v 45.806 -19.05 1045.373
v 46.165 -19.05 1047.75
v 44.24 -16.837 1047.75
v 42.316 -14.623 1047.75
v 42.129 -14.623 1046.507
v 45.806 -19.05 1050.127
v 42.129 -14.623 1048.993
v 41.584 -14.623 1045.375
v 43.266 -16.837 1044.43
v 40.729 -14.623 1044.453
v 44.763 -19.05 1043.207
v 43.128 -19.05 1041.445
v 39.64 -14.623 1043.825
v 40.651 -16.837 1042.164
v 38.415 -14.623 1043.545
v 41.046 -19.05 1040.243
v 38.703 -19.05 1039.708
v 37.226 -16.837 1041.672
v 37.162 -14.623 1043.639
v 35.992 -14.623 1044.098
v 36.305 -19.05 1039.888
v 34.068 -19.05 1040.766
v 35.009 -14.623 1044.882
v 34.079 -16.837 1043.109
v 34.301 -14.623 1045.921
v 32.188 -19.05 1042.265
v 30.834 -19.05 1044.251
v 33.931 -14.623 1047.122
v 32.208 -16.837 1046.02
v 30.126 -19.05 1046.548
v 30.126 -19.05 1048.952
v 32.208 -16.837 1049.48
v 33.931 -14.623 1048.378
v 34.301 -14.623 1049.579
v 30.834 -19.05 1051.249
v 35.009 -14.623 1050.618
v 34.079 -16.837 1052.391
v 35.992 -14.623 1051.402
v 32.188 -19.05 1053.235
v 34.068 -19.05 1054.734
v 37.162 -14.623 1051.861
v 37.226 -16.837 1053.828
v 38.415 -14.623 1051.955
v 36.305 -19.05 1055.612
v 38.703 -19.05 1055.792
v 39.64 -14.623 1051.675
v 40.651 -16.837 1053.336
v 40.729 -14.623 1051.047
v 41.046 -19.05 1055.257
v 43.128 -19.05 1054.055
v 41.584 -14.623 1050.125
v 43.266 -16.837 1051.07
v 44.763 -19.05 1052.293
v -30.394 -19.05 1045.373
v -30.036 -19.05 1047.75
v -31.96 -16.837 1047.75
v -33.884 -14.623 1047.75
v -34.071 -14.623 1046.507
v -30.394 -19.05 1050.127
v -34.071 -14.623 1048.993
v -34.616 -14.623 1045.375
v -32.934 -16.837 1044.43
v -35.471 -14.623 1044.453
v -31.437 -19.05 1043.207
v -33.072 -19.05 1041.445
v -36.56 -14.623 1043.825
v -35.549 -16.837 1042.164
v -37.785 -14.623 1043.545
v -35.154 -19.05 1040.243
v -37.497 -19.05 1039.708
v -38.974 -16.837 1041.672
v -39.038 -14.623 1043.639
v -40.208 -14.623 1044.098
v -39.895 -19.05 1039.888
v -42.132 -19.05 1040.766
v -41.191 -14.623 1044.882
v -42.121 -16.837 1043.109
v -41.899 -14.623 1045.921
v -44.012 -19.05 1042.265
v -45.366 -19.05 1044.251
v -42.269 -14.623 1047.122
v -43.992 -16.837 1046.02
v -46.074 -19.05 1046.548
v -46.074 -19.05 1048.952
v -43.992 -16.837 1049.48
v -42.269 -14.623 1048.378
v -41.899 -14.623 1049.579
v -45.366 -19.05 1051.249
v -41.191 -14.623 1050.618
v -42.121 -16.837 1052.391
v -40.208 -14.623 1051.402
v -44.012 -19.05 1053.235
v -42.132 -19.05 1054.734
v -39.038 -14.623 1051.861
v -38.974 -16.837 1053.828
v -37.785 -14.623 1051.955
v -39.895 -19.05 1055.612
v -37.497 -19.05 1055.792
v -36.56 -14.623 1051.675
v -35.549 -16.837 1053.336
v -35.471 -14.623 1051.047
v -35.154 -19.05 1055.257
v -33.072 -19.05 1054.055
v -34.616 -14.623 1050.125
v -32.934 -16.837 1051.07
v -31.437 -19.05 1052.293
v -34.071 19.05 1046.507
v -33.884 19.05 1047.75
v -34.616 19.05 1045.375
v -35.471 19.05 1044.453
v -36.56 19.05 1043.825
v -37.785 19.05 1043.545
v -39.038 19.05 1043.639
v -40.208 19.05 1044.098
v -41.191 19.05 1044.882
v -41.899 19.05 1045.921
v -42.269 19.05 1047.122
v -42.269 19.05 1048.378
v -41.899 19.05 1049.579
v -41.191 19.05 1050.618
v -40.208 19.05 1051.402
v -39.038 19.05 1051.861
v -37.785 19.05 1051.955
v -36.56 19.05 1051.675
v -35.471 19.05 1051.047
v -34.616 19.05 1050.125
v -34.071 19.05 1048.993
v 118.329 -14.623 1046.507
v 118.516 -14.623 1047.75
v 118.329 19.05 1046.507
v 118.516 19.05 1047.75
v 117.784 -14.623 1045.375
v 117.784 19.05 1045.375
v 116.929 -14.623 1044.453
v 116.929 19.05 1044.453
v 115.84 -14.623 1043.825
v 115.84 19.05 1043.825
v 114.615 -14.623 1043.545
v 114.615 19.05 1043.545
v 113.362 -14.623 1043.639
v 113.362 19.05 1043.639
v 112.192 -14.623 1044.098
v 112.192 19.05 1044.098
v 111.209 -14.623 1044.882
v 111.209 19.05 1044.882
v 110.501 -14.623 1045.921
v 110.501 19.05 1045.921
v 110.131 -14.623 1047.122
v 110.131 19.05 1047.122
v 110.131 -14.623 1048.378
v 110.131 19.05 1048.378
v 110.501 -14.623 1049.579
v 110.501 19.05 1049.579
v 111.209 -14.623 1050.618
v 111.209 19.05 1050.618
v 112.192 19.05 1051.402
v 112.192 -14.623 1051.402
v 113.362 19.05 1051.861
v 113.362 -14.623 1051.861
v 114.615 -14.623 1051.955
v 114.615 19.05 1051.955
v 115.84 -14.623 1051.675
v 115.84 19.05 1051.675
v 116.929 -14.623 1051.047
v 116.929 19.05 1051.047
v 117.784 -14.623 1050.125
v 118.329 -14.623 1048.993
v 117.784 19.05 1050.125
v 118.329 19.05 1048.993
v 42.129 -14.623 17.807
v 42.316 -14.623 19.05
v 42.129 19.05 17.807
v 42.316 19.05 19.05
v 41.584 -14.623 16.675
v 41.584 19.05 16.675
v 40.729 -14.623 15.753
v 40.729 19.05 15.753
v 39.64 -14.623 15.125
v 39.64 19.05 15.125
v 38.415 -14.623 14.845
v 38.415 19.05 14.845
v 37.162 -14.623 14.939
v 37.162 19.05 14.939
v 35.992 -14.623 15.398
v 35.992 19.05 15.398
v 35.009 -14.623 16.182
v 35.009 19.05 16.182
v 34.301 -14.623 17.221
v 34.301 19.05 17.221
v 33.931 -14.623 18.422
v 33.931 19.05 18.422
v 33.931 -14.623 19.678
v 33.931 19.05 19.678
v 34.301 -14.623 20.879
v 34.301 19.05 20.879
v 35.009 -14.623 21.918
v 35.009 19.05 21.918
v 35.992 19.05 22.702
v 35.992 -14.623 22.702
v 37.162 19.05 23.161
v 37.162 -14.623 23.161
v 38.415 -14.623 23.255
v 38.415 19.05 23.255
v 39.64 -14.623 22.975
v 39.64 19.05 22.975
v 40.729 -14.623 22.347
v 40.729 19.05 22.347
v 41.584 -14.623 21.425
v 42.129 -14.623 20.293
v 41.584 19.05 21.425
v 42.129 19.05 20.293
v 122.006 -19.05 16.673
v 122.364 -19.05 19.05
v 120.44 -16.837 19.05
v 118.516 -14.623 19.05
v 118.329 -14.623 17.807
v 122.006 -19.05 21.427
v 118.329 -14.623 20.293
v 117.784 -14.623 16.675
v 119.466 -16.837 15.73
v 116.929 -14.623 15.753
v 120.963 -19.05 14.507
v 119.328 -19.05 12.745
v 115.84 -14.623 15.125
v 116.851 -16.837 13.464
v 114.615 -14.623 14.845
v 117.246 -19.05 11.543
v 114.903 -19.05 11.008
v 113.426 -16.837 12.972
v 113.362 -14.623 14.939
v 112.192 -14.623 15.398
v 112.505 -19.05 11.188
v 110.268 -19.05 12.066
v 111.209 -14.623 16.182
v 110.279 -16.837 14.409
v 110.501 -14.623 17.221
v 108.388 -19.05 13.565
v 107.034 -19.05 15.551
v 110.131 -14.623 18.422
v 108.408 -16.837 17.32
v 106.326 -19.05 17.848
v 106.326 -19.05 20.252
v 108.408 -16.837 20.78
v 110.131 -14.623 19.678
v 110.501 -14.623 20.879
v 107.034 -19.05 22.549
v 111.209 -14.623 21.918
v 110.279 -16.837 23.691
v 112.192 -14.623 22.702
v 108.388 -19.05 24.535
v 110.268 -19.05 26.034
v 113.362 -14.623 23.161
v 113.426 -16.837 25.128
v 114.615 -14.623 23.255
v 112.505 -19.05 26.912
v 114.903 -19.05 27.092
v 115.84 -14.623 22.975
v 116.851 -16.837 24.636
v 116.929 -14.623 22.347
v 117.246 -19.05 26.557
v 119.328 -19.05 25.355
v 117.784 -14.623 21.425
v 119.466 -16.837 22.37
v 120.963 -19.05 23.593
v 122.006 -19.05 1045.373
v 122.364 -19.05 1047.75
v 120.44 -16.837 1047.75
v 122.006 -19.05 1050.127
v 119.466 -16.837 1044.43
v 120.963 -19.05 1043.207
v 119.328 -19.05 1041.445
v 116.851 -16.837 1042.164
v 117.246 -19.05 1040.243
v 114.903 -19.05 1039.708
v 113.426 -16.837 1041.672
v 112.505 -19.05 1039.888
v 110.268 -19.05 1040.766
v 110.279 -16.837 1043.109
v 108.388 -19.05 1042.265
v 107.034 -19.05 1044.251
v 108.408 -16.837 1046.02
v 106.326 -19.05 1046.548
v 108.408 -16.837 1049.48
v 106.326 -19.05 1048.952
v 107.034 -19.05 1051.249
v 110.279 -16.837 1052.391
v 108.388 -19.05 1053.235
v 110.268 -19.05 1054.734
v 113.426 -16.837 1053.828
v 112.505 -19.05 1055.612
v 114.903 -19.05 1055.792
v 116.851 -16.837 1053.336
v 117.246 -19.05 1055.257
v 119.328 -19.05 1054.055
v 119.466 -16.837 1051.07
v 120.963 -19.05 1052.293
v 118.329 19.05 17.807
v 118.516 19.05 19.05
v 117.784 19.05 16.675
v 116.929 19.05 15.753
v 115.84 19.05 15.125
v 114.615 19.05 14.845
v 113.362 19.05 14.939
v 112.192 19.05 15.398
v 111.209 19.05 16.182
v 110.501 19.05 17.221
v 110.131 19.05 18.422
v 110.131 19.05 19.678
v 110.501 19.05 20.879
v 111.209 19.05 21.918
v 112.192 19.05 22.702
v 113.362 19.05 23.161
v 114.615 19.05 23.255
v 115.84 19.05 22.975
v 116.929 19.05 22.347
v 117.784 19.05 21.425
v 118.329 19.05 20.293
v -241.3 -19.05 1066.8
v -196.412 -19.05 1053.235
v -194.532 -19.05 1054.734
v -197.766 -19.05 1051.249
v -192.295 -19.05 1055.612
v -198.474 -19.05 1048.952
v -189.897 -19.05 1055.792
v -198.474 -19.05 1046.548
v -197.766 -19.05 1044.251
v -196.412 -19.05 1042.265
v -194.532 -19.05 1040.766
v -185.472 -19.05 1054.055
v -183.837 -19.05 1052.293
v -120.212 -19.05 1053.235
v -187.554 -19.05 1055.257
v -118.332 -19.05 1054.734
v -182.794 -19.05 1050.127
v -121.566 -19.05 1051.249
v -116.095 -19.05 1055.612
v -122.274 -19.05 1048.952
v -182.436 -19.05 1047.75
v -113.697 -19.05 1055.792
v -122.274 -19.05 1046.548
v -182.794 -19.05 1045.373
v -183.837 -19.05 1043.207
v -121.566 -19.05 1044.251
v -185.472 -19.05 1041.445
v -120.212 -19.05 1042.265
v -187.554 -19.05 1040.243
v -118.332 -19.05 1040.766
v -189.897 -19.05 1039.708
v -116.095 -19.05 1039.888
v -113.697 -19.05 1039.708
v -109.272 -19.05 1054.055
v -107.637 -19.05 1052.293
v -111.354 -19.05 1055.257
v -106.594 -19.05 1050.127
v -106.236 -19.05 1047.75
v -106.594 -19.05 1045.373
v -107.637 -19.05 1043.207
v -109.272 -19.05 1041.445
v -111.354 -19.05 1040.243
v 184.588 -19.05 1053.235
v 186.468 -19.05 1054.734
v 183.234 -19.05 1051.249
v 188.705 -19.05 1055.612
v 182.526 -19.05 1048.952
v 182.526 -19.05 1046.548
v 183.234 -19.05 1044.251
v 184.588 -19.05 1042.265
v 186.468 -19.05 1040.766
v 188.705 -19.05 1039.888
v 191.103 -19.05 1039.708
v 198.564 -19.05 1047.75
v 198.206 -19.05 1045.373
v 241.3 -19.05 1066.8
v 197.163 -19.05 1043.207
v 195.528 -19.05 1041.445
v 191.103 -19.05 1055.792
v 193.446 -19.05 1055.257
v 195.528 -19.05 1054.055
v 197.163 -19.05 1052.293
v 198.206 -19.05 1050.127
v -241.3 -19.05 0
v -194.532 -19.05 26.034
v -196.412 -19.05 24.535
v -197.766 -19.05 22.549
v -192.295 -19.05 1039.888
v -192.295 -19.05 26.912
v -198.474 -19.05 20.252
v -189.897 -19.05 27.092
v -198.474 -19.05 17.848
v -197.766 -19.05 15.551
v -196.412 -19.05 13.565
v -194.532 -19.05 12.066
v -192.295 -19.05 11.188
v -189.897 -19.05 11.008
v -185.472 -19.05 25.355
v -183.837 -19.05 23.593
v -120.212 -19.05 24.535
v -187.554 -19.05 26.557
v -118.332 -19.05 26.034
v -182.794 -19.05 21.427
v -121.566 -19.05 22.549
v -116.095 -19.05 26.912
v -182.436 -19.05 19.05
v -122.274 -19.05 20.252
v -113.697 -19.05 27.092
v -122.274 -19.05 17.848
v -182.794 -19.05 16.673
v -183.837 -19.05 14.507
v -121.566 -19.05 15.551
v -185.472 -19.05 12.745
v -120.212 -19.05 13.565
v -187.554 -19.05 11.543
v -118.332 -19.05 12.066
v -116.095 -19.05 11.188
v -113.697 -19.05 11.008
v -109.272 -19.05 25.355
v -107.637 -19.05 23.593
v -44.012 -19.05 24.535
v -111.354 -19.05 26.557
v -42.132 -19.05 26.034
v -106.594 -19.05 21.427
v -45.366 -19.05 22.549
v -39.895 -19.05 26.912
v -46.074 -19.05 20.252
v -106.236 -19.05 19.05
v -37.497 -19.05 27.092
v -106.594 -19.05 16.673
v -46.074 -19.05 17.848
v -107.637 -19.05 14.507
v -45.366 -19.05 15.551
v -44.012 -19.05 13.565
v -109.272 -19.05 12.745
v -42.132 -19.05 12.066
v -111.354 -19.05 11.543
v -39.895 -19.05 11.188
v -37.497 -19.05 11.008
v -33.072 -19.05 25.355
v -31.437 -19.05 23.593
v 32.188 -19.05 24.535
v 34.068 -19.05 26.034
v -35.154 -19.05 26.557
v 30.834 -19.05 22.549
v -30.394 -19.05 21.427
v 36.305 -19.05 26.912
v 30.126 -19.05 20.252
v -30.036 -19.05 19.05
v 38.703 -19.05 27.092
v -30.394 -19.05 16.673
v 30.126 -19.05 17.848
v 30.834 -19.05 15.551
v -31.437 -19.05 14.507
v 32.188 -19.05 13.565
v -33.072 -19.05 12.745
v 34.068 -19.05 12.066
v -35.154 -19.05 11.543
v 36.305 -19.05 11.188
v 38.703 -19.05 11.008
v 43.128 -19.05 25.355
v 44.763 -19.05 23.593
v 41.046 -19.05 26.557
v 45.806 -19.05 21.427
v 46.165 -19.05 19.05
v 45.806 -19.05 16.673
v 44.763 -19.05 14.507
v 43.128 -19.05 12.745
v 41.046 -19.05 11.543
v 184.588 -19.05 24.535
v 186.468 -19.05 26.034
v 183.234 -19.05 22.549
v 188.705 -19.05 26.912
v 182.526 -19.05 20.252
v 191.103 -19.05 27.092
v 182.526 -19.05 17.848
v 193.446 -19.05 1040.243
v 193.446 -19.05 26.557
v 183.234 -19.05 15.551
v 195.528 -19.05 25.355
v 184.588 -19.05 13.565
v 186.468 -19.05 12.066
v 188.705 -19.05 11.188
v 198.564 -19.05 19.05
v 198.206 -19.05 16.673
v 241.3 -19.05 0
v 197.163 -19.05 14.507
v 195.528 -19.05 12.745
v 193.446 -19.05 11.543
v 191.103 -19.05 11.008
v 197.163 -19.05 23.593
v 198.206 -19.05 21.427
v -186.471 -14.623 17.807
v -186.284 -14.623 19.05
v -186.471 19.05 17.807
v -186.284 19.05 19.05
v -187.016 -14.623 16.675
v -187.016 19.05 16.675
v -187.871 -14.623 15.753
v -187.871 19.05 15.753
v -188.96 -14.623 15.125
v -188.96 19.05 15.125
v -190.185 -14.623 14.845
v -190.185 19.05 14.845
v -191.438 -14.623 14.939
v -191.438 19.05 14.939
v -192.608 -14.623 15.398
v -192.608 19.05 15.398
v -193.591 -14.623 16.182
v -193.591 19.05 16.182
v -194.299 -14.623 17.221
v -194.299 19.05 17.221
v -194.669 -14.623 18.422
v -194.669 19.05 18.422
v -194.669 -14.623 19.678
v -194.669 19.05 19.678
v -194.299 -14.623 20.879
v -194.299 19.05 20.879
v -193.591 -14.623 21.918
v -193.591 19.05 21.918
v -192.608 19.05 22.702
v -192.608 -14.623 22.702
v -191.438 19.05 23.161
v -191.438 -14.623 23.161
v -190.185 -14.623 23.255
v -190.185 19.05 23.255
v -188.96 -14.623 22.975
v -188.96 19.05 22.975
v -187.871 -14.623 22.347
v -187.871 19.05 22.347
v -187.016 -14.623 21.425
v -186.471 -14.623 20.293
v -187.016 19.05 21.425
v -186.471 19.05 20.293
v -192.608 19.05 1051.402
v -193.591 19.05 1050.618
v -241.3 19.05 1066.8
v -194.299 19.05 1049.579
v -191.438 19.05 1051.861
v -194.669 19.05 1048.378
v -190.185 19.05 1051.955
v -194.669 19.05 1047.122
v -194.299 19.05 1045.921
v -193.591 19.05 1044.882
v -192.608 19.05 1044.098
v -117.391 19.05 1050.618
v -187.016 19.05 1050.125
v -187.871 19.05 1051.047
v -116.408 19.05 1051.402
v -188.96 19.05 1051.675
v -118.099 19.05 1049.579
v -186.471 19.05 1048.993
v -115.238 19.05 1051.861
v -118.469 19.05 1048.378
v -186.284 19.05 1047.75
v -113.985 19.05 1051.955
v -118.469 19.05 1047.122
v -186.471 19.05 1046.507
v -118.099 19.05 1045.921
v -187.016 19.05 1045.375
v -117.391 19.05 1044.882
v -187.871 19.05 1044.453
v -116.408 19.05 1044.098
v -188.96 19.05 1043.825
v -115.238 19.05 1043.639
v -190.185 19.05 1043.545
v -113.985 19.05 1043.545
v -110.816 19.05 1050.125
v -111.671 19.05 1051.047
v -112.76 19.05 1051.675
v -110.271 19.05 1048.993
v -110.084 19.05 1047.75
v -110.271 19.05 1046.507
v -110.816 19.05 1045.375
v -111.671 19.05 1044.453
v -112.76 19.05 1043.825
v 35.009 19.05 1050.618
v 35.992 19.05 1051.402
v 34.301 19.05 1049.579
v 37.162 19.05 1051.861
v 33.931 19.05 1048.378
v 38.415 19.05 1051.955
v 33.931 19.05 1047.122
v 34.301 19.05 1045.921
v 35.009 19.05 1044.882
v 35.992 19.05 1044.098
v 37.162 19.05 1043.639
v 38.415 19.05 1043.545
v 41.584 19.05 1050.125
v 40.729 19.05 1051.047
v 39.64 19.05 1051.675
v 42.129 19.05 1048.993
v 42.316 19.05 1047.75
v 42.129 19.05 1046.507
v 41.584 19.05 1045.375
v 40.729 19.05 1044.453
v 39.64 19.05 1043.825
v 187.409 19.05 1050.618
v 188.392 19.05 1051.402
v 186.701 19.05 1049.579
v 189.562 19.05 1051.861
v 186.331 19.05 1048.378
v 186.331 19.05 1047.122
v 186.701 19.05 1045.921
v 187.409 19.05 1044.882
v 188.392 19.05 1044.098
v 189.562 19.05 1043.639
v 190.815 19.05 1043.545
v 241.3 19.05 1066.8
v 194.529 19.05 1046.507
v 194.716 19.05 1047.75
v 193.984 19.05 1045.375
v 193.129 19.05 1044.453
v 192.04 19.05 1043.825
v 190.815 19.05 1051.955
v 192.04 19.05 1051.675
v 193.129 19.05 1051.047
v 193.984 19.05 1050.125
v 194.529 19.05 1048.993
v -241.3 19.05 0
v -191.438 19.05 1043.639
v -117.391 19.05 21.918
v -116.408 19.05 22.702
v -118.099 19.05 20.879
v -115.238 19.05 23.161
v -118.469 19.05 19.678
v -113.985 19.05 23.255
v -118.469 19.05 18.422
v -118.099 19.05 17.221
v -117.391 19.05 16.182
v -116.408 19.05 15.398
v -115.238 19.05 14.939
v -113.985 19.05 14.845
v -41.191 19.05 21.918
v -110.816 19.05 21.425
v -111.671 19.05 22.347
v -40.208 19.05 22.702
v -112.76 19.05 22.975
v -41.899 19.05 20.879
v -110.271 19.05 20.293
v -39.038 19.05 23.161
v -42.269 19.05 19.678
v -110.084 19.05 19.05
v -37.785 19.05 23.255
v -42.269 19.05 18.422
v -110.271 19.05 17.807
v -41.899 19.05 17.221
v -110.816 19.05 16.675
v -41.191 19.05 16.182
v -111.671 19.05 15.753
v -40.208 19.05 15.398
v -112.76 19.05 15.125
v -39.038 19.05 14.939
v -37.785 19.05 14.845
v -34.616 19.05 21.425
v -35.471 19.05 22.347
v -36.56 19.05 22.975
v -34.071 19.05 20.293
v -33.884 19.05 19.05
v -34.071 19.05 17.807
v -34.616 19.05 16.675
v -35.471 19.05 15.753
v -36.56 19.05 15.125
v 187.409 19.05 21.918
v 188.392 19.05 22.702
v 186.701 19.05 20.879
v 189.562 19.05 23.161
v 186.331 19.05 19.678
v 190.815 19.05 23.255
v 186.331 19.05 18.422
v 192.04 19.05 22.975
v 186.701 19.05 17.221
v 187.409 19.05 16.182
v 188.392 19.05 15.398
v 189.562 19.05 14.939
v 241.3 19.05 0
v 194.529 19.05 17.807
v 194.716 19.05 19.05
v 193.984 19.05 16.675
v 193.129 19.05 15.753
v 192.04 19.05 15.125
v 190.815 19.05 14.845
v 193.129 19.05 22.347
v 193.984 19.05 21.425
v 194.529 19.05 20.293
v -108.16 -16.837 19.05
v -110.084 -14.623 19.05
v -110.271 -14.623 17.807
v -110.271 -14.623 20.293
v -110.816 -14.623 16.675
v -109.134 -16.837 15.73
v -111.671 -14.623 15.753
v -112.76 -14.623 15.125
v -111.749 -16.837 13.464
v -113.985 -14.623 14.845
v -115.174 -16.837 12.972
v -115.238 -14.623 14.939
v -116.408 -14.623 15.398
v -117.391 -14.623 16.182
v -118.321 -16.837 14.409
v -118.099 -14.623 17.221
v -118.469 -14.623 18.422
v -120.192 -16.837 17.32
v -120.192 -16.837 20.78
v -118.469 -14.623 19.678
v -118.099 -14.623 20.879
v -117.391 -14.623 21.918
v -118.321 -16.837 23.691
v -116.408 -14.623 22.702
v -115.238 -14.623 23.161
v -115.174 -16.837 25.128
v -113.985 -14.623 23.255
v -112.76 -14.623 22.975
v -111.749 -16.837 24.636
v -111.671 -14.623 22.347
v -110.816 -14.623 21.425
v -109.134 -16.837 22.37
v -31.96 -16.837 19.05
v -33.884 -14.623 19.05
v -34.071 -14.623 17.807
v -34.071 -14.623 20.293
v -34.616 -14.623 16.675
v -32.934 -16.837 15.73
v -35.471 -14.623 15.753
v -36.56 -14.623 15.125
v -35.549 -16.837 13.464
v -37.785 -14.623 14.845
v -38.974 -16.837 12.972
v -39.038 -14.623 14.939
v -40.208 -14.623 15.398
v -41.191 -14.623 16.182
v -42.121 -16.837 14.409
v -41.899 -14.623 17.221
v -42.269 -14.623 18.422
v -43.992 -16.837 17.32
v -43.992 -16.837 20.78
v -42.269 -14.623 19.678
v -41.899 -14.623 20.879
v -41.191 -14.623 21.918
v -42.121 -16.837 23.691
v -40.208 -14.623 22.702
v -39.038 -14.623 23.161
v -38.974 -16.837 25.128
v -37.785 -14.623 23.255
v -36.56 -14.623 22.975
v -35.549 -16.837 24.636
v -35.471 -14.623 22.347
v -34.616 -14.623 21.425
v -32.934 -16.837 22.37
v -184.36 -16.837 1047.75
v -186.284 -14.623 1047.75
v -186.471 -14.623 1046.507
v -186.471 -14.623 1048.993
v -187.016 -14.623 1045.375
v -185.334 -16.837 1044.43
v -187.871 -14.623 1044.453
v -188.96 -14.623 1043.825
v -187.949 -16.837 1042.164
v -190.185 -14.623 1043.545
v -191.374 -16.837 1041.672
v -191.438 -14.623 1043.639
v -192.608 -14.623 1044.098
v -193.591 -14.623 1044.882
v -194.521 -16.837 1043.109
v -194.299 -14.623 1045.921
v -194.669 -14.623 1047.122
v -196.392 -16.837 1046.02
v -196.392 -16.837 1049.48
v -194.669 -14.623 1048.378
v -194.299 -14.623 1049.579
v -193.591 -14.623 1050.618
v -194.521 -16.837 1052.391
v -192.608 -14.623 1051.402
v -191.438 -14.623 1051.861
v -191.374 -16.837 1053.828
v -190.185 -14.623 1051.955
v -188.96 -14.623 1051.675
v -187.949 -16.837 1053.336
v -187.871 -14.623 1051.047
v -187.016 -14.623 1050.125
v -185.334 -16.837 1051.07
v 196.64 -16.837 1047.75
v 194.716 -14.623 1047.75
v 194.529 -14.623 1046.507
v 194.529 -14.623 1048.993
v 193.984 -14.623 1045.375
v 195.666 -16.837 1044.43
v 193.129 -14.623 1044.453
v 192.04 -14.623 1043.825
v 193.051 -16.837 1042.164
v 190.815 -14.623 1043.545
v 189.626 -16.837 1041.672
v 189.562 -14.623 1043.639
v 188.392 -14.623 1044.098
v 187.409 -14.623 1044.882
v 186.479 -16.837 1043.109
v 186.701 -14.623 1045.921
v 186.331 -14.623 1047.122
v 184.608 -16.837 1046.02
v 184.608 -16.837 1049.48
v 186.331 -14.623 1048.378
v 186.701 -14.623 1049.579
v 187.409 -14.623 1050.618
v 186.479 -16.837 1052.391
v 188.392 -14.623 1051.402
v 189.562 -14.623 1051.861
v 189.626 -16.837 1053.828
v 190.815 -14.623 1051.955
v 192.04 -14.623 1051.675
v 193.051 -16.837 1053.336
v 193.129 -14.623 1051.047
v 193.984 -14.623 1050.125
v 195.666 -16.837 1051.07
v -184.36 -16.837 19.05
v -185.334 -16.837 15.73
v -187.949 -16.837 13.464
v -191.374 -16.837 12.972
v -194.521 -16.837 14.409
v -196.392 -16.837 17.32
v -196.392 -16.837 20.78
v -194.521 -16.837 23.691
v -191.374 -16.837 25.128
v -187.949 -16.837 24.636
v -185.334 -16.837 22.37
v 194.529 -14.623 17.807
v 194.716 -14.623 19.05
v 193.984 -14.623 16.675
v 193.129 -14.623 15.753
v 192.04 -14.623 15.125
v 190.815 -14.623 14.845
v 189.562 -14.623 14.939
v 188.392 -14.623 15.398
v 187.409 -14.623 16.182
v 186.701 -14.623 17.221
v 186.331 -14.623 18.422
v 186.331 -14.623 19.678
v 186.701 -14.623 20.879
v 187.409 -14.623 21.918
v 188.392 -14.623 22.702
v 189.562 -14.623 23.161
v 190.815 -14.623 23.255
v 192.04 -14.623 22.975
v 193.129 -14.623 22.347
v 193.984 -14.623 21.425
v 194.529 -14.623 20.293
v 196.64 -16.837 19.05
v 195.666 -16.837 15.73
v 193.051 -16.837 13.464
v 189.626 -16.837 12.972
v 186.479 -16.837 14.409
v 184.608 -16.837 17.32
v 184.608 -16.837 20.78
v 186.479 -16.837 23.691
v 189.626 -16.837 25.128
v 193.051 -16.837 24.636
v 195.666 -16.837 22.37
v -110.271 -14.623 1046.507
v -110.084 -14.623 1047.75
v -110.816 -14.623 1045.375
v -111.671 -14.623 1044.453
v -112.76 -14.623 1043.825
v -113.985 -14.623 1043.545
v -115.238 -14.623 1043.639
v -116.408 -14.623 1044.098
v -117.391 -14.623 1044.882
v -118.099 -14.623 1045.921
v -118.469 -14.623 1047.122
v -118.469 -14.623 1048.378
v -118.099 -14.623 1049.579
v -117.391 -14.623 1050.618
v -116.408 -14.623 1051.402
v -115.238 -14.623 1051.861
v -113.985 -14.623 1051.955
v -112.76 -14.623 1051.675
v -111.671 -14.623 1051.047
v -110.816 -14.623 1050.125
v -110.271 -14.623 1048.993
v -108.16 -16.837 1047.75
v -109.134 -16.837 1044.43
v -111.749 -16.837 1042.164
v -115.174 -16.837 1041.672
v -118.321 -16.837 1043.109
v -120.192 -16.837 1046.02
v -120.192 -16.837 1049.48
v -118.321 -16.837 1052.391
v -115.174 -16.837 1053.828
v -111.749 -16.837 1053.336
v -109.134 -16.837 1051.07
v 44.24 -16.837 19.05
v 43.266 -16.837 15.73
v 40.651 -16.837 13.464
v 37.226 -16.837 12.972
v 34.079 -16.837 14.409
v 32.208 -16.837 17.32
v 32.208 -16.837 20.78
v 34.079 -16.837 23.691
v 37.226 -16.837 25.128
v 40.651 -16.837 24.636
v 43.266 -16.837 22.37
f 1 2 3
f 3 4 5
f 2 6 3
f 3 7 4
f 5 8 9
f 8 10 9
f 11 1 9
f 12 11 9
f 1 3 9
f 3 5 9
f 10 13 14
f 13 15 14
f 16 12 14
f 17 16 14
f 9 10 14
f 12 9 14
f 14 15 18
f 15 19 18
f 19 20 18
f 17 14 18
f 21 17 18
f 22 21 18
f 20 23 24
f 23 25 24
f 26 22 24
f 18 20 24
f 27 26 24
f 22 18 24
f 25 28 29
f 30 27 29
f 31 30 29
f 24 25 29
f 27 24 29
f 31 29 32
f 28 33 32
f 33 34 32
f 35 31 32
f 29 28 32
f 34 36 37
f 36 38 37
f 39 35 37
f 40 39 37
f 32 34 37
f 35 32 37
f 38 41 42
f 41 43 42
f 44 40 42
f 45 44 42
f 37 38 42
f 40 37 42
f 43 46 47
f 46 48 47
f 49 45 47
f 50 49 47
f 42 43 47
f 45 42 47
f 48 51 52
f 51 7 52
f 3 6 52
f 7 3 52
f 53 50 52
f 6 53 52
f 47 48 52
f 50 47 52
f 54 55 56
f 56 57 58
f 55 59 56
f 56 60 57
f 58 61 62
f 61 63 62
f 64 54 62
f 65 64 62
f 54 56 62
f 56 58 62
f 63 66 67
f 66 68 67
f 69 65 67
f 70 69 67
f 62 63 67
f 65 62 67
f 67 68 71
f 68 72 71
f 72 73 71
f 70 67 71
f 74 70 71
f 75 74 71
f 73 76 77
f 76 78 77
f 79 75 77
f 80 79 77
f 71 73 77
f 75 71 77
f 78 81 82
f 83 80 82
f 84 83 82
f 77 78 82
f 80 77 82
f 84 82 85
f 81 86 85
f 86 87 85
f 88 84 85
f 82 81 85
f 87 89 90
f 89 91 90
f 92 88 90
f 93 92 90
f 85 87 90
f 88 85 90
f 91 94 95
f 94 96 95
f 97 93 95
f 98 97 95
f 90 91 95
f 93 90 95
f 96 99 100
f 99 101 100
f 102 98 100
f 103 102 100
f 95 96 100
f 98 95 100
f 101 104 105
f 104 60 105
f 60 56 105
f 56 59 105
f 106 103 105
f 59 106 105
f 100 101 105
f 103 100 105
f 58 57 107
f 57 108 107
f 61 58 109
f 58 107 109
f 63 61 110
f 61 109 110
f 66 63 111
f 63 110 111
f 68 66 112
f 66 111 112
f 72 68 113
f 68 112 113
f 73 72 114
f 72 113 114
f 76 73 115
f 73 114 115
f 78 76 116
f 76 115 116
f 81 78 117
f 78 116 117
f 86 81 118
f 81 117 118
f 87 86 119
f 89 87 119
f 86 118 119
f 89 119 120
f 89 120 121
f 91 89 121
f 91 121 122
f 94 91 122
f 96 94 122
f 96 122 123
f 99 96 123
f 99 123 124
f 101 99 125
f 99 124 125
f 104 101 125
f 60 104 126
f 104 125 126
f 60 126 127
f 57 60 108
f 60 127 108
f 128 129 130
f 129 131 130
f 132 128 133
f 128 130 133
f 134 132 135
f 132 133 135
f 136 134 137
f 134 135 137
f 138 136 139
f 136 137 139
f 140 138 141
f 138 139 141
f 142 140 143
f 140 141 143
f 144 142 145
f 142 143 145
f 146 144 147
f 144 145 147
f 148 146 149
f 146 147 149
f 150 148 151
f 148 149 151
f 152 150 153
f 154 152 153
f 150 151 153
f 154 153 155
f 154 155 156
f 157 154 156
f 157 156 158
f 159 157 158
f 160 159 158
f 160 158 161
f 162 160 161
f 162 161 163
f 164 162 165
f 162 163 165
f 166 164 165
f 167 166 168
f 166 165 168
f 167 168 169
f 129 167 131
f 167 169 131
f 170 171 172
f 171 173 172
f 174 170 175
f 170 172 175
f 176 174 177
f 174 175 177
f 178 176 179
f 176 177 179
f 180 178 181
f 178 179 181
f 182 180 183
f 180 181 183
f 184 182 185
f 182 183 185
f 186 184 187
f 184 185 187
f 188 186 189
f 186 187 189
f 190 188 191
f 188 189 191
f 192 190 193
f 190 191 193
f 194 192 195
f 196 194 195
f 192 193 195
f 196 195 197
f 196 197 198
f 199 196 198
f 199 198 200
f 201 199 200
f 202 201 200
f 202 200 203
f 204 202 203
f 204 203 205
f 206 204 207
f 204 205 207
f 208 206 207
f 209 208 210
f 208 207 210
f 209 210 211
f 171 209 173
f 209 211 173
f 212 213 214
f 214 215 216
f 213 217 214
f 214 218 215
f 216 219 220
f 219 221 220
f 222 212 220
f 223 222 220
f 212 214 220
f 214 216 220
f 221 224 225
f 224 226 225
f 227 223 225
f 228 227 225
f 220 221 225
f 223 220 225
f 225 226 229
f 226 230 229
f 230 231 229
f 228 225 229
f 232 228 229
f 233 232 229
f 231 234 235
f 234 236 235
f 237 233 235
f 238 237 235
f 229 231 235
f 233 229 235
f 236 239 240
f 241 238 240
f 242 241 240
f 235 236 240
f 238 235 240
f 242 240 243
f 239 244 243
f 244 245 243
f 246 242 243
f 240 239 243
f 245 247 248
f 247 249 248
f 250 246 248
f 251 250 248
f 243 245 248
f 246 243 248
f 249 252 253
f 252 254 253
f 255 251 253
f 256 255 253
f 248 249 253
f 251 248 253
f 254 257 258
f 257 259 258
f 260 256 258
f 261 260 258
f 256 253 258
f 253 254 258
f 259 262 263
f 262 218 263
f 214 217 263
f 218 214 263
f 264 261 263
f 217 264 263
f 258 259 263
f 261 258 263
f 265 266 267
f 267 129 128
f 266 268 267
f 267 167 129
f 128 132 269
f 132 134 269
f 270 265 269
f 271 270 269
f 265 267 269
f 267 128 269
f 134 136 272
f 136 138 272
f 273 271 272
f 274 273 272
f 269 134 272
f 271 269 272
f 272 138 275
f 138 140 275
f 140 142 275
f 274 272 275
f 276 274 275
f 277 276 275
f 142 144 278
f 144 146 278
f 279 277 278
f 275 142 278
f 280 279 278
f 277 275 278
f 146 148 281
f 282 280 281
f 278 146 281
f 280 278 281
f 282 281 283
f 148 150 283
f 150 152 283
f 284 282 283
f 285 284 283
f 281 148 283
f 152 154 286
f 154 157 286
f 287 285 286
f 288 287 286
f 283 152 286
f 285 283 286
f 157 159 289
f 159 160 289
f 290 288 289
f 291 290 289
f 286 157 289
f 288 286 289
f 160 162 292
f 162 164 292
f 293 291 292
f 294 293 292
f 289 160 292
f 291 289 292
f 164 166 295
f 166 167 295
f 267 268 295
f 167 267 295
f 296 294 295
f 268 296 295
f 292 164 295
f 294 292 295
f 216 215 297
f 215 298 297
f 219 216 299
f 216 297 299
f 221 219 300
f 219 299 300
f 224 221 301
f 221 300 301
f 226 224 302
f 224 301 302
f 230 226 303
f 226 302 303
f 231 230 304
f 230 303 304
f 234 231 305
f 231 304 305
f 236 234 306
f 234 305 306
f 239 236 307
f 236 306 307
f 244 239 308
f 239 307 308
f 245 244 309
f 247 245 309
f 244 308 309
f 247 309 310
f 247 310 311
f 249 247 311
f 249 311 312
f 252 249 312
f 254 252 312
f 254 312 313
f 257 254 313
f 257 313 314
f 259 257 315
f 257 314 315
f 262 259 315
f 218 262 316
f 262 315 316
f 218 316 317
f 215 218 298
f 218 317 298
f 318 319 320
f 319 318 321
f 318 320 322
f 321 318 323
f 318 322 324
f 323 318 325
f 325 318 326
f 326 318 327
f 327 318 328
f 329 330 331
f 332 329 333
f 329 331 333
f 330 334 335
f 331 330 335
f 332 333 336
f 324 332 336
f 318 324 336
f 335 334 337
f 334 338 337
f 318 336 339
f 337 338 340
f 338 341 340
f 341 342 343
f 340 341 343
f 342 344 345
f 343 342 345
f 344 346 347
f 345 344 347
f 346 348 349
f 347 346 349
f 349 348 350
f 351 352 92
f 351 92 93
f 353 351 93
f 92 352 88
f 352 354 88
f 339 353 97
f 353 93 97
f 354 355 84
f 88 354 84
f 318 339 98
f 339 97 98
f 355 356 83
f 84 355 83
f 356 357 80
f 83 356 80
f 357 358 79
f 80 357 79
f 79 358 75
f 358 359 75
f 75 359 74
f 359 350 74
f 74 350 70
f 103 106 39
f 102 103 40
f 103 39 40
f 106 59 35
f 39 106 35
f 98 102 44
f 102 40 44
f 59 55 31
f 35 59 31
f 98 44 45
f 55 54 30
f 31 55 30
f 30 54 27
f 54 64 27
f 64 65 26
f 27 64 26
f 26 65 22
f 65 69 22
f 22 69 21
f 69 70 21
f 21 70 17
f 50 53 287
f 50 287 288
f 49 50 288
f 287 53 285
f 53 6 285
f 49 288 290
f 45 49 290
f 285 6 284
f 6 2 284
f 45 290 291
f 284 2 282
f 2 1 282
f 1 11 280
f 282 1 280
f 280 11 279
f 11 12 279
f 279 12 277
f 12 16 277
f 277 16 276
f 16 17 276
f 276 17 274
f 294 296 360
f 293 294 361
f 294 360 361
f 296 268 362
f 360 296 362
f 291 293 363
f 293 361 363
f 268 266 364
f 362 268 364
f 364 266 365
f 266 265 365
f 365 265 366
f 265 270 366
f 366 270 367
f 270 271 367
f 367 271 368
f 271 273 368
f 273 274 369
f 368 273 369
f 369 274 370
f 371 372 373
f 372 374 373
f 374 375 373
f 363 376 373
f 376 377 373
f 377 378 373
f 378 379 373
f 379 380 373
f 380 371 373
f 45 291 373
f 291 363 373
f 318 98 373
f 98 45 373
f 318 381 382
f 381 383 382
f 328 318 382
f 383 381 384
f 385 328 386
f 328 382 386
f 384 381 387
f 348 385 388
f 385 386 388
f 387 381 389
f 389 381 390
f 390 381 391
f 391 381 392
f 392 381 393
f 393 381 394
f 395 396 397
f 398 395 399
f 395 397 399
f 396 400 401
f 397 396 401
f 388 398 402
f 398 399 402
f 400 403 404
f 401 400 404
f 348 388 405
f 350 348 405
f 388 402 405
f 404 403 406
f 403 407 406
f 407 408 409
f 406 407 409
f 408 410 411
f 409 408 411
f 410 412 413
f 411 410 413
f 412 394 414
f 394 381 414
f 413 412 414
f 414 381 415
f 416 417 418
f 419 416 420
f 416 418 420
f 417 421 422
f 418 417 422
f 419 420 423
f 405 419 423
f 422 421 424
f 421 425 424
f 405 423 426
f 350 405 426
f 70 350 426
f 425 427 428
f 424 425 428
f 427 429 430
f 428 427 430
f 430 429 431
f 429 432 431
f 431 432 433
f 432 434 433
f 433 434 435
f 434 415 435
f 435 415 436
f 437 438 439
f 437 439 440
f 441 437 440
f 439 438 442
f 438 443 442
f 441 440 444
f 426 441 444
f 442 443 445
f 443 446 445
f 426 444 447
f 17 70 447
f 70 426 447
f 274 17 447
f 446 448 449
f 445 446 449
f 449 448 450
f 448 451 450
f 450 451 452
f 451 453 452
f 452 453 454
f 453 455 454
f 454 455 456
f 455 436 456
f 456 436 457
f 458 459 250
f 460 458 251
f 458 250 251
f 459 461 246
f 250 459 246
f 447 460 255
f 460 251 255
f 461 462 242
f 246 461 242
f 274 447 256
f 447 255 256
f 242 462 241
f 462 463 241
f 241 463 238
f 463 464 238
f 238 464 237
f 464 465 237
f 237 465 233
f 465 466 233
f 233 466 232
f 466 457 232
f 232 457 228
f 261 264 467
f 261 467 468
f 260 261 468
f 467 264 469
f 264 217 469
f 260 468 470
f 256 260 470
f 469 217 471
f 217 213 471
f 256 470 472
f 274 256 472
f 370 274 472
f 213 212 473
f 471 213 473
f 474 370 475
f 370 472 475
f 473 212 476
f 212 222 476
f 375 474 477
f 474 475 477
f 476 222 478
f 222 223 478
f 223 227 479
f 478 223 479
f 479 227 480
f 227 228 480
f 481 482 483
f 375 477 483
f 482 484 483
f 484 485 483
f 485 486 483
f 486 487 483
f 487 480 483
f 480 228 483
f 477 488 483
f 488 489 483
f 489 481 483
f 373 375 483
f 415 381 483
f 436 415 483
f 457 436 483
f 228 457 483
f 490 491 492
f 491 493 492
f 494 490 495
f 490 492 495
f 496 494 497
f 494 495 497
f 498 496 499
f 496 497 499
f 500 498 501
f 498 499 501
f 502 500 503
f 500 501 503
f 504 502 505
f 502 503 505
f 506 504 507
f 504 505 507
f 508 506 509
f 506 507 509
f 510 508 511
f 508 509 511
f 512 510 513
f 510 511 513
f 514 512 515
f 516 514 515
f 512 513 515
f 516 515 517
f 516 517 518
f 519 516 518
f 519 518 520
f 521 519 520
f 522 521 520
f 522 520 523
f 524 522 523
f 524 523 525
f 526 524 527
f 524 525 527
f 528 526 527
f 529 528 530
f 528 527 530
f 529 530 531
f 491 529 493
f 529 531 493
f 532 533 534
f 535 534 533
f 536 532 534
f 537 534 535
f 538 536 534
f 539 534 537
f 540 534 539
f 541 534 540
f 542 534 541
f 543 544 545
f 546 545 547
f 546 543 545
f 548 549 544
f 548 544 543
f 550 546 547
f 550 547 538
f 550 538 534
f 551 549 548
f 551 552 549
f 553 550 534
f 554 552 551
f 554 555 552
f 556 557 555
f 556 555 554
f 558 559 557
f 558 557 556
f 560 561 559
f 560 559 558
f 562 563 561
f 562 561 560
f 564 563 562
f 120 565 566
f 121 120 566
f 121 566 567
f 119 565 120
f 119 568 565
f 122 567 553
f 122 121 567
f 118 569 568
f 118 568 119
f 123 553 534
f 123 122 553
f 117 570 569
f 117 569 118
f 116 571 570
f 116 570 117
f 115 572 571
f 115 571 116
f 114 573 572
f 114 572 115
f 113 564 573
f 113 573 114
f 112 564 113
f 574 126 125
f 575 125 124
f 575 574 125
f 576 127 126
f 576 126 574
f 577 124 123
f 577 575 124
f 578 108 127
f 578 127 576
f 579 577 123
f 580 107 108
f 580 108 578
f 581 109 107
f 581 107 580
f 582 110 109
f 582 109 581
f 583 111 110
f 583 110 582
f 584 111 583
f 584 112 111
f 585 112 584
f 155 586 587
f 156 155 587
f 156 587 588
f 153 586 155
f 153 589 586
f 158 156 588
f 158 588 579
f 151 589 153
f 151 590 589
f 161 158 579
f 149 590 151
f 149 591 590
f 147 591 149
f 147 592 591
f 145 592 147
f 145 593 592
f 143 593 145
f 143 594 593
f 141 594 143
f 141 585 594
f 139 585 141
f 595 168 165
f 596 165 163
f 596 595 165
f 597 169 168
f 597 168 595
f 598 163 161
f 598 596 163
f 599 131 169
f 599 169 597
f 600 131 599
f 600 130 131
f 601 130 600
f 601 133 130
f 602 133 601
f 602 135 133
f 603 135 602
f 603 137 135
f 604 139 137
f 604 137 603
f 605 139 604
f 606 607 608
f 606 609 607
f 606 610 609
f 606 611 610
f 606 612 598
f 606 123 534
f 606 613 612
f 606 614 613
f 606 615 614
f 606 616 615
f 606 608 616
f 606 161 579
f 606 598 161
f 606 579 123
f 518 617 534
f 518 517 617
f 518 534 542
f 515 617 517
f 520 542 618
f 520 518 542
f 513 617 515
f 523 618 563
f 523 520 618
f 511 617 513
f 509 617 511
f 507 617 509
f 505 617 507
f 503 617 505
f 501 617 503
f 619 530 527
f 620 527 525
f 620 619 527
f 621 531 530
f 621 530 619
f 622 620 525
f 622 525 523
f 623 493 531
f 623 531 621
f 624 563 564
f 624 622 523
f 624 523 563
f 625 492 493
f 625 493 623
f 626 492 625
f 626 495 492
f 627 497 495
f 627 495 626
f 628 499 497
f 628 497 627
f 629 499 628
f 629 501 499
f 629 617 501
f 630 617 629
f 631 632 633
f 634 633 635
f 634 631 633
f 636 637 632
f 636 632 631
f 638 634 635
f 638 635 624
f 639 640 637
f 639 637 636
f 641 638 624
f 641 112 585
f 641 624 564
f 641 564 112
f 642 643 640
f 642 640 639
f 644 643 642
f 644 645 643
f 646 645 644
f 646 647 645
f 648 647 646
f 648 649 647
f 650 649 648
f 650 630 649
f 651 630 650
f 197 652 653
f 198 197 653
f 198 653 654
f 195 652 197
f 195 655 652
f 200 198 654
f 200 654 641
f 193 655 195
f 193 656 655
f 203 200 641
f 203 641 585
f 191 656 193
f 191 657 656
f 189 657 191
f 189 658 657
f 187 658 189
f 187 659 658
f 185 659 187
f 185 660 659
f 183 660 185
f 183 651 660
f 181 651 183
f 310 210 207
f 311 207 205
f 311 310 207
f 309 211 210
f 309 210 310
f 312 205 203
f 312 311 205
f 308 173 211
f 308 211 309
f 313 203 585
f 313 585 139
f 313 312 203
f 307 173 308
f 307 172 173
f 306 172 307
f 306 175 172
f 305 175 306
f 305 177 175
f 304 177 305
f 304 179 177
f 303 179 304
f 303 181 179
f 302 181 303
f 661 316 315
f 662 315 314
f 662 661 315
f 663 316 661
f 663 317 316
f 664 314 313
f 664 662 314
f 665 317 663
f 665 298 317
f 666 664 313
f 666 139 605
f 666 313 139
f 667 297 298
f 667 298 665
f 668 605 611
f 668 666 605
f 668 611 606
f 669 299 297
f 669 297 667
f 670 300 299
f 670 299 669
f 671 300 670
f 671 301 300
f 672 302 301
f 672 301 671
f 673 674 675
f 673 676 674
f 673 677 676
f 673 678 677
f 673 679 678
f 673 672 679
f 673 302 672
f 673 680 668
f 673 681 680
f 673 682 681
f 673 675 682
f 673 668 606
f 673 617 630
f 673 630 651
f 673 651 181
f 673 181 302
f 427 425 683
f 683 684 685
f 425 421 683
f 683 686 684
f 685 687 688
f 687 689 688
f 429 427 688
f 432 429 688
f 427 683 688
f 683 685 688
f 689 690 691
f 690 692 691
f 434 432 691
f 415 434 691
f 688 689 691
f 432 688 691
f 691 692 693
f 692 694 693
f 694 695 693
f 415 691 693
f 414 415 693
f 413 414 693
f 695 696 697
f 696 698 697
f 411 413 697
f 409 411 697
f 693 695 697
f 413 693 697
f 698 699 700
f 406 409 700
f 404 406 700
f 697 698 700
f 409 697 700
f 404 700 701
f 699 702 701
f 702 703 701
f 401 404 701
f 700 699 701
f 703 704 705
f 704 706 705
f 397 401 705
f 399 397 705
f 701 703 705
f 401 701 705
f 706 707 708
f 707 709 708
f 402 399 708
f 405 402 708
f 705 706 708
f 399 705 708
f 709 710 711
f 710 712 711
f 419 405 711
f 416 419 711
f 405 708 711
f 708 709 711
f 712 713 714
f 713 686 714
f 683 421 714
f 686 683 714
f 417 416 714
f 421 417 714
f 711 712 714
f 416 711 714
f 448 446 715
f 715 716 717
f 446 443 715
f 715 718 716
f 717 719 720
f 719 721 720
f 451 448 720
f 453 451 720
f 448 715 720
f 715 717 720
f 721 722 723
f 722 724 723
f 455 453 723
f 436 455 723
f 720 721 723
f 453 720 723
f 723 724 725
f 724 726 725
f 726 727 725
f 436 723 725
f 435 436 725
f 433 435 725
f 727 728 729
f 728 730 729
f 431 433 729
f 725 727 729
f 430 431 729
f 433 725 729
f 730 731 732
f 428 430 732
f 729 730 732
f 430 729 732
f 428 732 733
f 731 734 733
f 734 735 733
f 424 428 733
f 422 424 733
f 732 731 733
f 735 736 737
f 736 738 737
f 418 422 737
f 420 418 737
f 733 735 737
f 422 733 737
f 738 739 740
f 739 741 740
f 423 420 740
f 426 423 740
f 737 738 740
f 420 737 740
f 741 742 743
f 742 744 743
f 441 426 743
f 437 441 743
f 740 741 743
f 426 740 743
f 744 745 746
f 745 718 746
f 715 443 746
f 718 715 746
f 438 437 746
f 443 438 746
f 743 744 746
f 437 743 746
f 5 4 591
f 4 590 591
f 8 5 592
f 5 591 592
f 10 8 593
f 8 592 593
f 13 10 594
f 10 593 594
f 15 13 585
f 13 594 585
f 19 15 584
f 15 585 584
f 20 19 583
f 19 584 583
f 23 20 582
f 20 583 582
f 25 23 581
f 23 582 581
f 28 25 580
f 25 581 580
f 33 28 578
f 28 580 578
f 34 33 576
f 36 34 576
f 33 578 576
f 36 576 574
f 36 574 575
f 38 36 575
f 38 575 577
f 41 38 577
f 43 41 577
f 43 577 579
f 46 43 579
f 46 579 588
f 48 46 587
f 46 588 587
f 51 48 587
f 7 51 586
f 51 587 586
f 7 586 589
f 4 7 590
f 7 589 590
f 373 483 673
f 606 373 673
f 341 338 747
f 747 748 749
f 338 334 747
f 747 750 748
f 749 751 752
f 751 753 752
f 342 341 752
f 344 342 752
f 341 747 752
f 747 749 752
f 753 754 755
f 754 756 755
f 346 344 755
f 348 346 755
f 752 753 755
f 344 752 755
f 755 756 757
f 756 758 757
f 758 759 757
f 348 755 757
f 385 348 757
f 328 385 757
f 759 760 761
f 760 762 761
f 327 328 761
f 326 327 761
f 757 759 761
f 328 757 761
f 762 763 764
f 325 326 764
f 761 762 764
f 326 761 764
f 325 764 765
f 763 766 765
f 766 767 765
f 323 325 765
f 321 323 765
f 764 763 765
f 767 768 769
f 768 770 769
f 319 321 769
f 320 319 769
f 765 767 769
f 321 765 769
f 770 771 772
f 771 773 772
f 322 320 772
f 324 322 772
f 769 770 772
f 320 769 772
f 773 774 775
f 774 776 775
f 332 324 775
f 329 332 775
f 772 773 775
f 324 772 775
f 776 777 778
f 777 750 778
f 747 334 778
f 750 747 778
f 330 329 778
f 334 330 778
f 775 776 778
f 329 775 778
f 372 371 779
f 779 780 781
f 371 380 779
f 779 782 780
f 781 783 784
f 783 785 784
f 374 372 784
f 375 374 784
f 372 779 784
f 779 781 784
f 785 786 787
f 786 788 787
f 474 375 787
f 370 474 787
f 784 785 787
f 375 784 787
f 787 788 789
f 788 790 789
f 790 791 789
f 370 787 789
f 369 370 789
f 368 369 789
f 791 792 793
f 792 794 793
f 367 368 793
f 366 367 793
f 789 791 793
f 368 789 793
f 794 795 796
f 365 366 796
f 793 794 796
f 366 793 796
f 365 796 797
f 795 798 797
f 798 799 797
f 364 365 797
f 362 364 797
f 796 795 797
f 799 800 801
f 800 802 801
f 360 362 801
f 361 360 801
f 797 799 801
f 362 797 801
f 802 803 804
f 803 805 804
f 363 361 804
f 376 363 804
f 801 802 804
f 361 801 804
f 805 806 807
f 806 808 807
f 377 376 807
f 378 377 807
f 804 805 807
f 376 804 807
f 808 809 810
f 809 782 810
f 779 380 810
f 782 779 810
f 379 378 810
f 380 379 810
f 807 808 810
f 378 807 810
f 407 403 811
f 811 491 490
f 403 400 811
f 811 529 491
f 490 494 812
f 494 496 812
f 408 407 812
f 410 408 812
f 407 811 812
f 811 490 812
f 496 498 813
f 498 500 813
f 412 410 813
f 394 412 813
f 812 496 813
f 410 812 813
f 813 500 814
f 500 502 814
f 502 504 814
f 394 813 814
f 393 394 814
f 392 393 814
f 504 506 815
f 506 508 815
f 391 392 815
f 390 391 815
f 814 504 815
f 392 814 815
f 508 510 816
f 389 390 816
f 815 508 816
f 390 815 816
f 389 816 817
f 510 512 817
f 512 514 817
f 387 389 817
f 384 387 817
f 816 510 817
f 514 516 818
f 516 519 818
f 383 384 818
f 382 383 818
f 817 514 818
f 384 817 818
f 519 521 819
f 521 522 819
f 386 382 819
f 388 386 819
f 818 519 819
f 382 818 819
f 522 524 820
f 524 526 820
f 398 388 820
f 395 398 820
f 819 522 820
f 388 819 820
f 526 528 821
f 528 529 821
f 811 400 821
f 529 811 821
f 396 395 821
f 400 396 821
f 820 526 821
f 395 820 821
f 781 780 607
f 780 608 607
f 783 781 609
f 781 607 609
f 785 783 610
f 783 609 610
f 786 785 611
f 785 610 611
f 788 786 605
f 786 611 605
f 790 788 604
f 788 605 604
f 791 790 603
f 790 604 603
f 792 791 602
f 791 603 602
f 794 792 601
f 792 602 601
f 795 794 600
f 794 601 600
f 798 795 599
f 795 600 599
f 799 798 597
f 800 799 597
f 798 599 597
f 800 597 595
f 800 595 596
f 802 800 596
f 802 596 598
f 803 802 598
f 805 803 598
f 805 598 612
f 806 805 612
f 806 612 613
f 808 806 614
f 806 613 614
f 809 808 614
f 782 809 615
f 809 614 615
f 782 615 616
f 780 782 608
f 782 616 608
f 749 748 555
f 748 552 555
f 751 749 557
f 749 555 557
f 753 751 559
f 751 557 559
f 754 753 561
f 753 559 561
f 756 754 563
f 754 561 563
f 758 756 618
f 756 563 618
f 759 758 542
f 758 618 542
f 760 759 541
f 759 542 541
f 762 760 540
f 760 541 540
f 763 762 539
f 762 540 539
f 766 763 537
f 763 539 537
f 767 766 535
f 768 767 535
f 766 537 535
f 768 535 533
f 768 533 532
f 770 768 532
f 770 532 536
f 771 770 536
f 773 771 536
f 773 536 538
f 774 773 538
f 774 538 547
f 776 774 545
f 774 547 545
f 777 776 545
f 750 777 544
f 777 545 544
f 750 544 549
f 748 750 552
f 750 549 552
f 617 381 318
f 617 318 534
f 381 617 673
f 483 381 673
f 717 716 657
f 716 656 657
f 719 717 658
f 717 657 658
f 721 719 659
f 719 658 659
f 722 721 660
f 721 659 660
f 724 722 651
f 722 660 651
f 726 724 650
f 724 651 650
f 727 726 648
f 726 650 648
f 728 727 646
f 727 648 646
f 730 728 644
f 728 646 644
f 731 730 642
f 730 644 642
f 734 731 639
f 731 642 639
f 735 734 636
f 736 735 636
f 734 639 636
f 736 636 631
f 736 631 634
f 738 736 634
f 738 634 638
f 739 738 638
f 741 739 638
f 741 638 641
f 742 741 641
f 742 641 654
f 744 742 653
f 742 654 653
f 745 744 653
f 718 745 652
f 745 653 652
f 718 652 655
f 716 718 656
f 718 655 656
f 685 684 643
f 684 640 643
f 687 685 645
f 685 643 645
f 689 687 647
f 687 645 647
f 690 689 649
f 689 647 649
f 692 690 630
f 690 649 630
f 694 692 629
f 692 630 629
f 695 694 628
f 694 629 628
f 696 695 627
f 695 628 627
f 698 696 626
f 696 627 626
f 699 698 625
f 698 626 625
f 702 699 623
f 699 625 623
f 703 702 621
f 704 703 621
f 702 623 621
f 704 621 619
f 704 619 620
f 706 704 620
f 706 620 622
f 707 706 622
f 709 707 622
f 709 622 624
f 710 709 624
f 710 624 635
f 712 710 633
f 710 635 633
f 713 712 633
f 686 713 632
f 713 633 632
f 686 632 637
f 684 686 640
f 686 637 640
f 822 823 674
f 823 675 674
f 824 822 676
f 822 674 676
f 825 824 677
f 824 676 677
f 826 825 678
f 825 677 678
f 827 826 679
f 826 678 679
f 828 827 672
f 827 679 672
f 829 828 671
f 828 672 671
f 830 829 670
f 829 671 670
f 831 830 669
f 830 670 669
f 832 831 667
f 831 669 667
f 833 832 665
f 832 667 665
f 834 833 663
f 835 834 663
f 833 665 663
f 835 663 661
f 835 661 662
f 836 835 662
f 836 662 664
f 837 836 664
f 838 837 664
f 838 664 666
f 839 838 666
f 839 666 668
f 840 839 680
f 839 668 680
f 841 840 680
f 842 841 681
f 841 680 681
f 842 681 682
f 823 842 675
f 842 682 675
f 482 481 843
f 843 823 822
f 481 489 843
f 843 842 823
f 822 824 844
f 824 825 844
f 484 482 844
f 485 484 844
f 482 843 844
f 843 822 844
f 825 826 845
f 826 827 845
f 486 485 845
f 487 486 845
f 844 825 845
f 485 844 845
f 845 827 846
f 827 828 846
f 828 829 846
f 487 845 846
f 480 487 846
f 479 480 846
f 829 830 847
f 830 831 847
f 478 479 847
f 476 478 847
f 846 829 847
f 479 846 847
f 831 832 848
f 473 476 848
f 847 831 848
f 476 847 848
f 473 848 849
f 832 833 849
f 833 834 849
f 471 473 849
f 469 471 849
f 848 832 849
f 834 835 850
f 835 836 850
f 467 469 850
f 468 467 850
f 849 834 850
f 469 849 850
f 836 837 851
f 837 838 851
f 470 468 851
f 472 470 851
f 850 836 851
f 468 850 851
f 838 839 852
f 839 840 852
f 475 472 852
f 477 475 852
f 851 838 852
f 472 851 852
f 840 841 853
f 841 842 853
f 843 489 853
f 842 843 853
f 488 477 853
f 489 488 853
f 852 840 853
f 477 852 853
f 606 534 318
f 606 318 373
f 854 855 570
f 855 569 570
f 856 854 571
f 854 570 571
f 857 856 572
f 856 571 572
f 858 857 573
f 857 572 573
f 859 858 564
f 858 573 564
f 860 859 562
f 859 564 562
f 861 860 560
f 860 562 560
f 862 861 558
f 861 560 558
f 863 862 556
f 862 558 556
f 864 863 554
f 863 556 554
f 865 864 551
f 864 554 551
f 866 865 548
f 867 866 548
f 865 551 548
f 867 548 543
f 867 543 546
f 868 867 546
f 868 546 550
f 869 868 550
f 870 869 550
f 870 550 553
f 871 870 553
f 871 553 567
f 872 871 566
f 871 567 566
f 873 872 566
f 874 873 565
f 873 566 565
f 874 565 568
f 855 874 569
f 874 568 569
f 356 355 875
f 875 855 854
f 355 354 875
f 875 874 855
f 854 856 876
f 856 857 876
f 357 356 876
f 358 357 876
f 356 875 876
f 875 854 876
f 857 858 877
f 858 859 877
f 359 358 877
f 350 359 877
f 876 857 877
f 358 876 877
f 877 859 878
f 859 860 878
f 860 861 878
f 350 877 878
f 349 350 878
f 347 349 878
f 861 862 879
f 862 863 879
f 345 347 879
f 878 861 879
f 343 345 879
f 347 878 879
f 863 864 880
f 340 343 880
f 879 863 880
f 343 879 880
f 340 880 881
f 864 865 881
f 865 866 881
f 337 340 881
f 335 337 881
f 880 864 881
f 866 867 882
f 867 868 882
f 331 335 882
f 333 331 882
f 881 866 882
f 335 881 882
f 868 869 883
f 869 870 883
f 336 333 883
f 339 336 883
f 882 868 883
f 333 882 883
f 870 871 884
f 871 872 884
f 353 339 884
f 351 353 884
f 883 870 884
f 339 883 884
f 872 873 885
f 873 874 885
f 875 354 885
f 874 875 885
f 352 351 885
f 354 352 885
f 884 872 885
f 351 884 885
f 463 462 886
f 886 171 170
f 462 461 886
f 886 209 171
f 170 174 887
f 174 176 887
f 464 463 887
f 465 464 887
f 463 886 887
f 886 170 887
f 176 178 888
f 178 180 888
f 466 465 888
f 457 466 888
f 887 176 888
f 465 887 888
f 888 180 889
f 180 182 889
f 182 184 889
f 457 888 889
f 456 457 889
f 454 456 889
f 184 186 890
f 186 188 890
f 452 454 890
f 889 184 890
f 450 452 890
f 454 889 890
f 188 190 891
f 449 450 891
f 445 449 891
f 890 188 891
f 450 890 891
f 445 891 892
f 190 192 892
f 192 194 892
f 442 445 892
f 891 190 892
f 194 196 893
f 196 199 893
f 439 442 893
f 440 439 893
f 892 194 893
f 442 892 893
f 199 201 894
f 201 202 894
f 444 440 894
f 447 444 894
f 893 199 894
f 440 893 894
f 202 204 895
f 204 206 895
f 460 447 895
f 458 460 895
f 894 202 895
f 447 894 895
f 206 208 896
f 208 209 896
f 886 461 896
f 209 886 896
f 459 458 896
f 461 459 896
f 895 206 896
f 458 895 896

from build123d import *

# Parameters (mm, degrees)
SKETCH2_W                                         = 482.6
SKETCH2_H                                         = 38.1
BOSS_EXTRUDE1_DEPTH                               = 1066.8
CSK_FOR_5_16_FLAT_HEAD_MACHINE_SCREW1_D           = 8.4328
CSK_FOR_5_16_FLAT_HEAD_MACHINE_SCREW1_CSINK_D     = 16.129
CSK_FOR_5_16_FLAT_HEAD_MACHINE_SCREW1_CSINK_ANGLE = 82


with BuildPart() as part:
    # Sketch2 → Boss-Extrude1 (new body)
    with BuildSketch(Plane.XY):
        Rectangle(SKETCH2_W, SKETCH2_H)
    extrude(amount=BOSS_EXTRUDE1_DEPTH)

    # CSK for 5/16 Flat Head Machine Screw1 (through all)
    with Locations(Plane(origin=(0, -19.05, 0), x_dir=(-1, 0, 0), z_dir=(0, -1, 0))):
        with Locations((190.5, -1047.75), (114.3, -1047.75), (38.1, -1047.75), (-38.1, -1047.75), (-114.3, -1047.75), (-190.5, -1047.75), (114.3, -19.05), (38.1, -19.05), (-38.1, -19.05), (-114.3, -19.05), (-190.5, -19.05), (190.5, -19.05)):
            CounterSinkHole(CSK_FOR_5_16_FLAT_HEAD_MACHINE_SCREW1_D / 2, CSK_FOR_5_16_FLAT_HEAD_MACHINE_SCREW1_CSINK_D / 2, counter_sink_angle=CSK_FOR_5_16_FLAT_HEAD_MACHINE_SCREW1_CSINK_ANGLE)


solid = part.part
